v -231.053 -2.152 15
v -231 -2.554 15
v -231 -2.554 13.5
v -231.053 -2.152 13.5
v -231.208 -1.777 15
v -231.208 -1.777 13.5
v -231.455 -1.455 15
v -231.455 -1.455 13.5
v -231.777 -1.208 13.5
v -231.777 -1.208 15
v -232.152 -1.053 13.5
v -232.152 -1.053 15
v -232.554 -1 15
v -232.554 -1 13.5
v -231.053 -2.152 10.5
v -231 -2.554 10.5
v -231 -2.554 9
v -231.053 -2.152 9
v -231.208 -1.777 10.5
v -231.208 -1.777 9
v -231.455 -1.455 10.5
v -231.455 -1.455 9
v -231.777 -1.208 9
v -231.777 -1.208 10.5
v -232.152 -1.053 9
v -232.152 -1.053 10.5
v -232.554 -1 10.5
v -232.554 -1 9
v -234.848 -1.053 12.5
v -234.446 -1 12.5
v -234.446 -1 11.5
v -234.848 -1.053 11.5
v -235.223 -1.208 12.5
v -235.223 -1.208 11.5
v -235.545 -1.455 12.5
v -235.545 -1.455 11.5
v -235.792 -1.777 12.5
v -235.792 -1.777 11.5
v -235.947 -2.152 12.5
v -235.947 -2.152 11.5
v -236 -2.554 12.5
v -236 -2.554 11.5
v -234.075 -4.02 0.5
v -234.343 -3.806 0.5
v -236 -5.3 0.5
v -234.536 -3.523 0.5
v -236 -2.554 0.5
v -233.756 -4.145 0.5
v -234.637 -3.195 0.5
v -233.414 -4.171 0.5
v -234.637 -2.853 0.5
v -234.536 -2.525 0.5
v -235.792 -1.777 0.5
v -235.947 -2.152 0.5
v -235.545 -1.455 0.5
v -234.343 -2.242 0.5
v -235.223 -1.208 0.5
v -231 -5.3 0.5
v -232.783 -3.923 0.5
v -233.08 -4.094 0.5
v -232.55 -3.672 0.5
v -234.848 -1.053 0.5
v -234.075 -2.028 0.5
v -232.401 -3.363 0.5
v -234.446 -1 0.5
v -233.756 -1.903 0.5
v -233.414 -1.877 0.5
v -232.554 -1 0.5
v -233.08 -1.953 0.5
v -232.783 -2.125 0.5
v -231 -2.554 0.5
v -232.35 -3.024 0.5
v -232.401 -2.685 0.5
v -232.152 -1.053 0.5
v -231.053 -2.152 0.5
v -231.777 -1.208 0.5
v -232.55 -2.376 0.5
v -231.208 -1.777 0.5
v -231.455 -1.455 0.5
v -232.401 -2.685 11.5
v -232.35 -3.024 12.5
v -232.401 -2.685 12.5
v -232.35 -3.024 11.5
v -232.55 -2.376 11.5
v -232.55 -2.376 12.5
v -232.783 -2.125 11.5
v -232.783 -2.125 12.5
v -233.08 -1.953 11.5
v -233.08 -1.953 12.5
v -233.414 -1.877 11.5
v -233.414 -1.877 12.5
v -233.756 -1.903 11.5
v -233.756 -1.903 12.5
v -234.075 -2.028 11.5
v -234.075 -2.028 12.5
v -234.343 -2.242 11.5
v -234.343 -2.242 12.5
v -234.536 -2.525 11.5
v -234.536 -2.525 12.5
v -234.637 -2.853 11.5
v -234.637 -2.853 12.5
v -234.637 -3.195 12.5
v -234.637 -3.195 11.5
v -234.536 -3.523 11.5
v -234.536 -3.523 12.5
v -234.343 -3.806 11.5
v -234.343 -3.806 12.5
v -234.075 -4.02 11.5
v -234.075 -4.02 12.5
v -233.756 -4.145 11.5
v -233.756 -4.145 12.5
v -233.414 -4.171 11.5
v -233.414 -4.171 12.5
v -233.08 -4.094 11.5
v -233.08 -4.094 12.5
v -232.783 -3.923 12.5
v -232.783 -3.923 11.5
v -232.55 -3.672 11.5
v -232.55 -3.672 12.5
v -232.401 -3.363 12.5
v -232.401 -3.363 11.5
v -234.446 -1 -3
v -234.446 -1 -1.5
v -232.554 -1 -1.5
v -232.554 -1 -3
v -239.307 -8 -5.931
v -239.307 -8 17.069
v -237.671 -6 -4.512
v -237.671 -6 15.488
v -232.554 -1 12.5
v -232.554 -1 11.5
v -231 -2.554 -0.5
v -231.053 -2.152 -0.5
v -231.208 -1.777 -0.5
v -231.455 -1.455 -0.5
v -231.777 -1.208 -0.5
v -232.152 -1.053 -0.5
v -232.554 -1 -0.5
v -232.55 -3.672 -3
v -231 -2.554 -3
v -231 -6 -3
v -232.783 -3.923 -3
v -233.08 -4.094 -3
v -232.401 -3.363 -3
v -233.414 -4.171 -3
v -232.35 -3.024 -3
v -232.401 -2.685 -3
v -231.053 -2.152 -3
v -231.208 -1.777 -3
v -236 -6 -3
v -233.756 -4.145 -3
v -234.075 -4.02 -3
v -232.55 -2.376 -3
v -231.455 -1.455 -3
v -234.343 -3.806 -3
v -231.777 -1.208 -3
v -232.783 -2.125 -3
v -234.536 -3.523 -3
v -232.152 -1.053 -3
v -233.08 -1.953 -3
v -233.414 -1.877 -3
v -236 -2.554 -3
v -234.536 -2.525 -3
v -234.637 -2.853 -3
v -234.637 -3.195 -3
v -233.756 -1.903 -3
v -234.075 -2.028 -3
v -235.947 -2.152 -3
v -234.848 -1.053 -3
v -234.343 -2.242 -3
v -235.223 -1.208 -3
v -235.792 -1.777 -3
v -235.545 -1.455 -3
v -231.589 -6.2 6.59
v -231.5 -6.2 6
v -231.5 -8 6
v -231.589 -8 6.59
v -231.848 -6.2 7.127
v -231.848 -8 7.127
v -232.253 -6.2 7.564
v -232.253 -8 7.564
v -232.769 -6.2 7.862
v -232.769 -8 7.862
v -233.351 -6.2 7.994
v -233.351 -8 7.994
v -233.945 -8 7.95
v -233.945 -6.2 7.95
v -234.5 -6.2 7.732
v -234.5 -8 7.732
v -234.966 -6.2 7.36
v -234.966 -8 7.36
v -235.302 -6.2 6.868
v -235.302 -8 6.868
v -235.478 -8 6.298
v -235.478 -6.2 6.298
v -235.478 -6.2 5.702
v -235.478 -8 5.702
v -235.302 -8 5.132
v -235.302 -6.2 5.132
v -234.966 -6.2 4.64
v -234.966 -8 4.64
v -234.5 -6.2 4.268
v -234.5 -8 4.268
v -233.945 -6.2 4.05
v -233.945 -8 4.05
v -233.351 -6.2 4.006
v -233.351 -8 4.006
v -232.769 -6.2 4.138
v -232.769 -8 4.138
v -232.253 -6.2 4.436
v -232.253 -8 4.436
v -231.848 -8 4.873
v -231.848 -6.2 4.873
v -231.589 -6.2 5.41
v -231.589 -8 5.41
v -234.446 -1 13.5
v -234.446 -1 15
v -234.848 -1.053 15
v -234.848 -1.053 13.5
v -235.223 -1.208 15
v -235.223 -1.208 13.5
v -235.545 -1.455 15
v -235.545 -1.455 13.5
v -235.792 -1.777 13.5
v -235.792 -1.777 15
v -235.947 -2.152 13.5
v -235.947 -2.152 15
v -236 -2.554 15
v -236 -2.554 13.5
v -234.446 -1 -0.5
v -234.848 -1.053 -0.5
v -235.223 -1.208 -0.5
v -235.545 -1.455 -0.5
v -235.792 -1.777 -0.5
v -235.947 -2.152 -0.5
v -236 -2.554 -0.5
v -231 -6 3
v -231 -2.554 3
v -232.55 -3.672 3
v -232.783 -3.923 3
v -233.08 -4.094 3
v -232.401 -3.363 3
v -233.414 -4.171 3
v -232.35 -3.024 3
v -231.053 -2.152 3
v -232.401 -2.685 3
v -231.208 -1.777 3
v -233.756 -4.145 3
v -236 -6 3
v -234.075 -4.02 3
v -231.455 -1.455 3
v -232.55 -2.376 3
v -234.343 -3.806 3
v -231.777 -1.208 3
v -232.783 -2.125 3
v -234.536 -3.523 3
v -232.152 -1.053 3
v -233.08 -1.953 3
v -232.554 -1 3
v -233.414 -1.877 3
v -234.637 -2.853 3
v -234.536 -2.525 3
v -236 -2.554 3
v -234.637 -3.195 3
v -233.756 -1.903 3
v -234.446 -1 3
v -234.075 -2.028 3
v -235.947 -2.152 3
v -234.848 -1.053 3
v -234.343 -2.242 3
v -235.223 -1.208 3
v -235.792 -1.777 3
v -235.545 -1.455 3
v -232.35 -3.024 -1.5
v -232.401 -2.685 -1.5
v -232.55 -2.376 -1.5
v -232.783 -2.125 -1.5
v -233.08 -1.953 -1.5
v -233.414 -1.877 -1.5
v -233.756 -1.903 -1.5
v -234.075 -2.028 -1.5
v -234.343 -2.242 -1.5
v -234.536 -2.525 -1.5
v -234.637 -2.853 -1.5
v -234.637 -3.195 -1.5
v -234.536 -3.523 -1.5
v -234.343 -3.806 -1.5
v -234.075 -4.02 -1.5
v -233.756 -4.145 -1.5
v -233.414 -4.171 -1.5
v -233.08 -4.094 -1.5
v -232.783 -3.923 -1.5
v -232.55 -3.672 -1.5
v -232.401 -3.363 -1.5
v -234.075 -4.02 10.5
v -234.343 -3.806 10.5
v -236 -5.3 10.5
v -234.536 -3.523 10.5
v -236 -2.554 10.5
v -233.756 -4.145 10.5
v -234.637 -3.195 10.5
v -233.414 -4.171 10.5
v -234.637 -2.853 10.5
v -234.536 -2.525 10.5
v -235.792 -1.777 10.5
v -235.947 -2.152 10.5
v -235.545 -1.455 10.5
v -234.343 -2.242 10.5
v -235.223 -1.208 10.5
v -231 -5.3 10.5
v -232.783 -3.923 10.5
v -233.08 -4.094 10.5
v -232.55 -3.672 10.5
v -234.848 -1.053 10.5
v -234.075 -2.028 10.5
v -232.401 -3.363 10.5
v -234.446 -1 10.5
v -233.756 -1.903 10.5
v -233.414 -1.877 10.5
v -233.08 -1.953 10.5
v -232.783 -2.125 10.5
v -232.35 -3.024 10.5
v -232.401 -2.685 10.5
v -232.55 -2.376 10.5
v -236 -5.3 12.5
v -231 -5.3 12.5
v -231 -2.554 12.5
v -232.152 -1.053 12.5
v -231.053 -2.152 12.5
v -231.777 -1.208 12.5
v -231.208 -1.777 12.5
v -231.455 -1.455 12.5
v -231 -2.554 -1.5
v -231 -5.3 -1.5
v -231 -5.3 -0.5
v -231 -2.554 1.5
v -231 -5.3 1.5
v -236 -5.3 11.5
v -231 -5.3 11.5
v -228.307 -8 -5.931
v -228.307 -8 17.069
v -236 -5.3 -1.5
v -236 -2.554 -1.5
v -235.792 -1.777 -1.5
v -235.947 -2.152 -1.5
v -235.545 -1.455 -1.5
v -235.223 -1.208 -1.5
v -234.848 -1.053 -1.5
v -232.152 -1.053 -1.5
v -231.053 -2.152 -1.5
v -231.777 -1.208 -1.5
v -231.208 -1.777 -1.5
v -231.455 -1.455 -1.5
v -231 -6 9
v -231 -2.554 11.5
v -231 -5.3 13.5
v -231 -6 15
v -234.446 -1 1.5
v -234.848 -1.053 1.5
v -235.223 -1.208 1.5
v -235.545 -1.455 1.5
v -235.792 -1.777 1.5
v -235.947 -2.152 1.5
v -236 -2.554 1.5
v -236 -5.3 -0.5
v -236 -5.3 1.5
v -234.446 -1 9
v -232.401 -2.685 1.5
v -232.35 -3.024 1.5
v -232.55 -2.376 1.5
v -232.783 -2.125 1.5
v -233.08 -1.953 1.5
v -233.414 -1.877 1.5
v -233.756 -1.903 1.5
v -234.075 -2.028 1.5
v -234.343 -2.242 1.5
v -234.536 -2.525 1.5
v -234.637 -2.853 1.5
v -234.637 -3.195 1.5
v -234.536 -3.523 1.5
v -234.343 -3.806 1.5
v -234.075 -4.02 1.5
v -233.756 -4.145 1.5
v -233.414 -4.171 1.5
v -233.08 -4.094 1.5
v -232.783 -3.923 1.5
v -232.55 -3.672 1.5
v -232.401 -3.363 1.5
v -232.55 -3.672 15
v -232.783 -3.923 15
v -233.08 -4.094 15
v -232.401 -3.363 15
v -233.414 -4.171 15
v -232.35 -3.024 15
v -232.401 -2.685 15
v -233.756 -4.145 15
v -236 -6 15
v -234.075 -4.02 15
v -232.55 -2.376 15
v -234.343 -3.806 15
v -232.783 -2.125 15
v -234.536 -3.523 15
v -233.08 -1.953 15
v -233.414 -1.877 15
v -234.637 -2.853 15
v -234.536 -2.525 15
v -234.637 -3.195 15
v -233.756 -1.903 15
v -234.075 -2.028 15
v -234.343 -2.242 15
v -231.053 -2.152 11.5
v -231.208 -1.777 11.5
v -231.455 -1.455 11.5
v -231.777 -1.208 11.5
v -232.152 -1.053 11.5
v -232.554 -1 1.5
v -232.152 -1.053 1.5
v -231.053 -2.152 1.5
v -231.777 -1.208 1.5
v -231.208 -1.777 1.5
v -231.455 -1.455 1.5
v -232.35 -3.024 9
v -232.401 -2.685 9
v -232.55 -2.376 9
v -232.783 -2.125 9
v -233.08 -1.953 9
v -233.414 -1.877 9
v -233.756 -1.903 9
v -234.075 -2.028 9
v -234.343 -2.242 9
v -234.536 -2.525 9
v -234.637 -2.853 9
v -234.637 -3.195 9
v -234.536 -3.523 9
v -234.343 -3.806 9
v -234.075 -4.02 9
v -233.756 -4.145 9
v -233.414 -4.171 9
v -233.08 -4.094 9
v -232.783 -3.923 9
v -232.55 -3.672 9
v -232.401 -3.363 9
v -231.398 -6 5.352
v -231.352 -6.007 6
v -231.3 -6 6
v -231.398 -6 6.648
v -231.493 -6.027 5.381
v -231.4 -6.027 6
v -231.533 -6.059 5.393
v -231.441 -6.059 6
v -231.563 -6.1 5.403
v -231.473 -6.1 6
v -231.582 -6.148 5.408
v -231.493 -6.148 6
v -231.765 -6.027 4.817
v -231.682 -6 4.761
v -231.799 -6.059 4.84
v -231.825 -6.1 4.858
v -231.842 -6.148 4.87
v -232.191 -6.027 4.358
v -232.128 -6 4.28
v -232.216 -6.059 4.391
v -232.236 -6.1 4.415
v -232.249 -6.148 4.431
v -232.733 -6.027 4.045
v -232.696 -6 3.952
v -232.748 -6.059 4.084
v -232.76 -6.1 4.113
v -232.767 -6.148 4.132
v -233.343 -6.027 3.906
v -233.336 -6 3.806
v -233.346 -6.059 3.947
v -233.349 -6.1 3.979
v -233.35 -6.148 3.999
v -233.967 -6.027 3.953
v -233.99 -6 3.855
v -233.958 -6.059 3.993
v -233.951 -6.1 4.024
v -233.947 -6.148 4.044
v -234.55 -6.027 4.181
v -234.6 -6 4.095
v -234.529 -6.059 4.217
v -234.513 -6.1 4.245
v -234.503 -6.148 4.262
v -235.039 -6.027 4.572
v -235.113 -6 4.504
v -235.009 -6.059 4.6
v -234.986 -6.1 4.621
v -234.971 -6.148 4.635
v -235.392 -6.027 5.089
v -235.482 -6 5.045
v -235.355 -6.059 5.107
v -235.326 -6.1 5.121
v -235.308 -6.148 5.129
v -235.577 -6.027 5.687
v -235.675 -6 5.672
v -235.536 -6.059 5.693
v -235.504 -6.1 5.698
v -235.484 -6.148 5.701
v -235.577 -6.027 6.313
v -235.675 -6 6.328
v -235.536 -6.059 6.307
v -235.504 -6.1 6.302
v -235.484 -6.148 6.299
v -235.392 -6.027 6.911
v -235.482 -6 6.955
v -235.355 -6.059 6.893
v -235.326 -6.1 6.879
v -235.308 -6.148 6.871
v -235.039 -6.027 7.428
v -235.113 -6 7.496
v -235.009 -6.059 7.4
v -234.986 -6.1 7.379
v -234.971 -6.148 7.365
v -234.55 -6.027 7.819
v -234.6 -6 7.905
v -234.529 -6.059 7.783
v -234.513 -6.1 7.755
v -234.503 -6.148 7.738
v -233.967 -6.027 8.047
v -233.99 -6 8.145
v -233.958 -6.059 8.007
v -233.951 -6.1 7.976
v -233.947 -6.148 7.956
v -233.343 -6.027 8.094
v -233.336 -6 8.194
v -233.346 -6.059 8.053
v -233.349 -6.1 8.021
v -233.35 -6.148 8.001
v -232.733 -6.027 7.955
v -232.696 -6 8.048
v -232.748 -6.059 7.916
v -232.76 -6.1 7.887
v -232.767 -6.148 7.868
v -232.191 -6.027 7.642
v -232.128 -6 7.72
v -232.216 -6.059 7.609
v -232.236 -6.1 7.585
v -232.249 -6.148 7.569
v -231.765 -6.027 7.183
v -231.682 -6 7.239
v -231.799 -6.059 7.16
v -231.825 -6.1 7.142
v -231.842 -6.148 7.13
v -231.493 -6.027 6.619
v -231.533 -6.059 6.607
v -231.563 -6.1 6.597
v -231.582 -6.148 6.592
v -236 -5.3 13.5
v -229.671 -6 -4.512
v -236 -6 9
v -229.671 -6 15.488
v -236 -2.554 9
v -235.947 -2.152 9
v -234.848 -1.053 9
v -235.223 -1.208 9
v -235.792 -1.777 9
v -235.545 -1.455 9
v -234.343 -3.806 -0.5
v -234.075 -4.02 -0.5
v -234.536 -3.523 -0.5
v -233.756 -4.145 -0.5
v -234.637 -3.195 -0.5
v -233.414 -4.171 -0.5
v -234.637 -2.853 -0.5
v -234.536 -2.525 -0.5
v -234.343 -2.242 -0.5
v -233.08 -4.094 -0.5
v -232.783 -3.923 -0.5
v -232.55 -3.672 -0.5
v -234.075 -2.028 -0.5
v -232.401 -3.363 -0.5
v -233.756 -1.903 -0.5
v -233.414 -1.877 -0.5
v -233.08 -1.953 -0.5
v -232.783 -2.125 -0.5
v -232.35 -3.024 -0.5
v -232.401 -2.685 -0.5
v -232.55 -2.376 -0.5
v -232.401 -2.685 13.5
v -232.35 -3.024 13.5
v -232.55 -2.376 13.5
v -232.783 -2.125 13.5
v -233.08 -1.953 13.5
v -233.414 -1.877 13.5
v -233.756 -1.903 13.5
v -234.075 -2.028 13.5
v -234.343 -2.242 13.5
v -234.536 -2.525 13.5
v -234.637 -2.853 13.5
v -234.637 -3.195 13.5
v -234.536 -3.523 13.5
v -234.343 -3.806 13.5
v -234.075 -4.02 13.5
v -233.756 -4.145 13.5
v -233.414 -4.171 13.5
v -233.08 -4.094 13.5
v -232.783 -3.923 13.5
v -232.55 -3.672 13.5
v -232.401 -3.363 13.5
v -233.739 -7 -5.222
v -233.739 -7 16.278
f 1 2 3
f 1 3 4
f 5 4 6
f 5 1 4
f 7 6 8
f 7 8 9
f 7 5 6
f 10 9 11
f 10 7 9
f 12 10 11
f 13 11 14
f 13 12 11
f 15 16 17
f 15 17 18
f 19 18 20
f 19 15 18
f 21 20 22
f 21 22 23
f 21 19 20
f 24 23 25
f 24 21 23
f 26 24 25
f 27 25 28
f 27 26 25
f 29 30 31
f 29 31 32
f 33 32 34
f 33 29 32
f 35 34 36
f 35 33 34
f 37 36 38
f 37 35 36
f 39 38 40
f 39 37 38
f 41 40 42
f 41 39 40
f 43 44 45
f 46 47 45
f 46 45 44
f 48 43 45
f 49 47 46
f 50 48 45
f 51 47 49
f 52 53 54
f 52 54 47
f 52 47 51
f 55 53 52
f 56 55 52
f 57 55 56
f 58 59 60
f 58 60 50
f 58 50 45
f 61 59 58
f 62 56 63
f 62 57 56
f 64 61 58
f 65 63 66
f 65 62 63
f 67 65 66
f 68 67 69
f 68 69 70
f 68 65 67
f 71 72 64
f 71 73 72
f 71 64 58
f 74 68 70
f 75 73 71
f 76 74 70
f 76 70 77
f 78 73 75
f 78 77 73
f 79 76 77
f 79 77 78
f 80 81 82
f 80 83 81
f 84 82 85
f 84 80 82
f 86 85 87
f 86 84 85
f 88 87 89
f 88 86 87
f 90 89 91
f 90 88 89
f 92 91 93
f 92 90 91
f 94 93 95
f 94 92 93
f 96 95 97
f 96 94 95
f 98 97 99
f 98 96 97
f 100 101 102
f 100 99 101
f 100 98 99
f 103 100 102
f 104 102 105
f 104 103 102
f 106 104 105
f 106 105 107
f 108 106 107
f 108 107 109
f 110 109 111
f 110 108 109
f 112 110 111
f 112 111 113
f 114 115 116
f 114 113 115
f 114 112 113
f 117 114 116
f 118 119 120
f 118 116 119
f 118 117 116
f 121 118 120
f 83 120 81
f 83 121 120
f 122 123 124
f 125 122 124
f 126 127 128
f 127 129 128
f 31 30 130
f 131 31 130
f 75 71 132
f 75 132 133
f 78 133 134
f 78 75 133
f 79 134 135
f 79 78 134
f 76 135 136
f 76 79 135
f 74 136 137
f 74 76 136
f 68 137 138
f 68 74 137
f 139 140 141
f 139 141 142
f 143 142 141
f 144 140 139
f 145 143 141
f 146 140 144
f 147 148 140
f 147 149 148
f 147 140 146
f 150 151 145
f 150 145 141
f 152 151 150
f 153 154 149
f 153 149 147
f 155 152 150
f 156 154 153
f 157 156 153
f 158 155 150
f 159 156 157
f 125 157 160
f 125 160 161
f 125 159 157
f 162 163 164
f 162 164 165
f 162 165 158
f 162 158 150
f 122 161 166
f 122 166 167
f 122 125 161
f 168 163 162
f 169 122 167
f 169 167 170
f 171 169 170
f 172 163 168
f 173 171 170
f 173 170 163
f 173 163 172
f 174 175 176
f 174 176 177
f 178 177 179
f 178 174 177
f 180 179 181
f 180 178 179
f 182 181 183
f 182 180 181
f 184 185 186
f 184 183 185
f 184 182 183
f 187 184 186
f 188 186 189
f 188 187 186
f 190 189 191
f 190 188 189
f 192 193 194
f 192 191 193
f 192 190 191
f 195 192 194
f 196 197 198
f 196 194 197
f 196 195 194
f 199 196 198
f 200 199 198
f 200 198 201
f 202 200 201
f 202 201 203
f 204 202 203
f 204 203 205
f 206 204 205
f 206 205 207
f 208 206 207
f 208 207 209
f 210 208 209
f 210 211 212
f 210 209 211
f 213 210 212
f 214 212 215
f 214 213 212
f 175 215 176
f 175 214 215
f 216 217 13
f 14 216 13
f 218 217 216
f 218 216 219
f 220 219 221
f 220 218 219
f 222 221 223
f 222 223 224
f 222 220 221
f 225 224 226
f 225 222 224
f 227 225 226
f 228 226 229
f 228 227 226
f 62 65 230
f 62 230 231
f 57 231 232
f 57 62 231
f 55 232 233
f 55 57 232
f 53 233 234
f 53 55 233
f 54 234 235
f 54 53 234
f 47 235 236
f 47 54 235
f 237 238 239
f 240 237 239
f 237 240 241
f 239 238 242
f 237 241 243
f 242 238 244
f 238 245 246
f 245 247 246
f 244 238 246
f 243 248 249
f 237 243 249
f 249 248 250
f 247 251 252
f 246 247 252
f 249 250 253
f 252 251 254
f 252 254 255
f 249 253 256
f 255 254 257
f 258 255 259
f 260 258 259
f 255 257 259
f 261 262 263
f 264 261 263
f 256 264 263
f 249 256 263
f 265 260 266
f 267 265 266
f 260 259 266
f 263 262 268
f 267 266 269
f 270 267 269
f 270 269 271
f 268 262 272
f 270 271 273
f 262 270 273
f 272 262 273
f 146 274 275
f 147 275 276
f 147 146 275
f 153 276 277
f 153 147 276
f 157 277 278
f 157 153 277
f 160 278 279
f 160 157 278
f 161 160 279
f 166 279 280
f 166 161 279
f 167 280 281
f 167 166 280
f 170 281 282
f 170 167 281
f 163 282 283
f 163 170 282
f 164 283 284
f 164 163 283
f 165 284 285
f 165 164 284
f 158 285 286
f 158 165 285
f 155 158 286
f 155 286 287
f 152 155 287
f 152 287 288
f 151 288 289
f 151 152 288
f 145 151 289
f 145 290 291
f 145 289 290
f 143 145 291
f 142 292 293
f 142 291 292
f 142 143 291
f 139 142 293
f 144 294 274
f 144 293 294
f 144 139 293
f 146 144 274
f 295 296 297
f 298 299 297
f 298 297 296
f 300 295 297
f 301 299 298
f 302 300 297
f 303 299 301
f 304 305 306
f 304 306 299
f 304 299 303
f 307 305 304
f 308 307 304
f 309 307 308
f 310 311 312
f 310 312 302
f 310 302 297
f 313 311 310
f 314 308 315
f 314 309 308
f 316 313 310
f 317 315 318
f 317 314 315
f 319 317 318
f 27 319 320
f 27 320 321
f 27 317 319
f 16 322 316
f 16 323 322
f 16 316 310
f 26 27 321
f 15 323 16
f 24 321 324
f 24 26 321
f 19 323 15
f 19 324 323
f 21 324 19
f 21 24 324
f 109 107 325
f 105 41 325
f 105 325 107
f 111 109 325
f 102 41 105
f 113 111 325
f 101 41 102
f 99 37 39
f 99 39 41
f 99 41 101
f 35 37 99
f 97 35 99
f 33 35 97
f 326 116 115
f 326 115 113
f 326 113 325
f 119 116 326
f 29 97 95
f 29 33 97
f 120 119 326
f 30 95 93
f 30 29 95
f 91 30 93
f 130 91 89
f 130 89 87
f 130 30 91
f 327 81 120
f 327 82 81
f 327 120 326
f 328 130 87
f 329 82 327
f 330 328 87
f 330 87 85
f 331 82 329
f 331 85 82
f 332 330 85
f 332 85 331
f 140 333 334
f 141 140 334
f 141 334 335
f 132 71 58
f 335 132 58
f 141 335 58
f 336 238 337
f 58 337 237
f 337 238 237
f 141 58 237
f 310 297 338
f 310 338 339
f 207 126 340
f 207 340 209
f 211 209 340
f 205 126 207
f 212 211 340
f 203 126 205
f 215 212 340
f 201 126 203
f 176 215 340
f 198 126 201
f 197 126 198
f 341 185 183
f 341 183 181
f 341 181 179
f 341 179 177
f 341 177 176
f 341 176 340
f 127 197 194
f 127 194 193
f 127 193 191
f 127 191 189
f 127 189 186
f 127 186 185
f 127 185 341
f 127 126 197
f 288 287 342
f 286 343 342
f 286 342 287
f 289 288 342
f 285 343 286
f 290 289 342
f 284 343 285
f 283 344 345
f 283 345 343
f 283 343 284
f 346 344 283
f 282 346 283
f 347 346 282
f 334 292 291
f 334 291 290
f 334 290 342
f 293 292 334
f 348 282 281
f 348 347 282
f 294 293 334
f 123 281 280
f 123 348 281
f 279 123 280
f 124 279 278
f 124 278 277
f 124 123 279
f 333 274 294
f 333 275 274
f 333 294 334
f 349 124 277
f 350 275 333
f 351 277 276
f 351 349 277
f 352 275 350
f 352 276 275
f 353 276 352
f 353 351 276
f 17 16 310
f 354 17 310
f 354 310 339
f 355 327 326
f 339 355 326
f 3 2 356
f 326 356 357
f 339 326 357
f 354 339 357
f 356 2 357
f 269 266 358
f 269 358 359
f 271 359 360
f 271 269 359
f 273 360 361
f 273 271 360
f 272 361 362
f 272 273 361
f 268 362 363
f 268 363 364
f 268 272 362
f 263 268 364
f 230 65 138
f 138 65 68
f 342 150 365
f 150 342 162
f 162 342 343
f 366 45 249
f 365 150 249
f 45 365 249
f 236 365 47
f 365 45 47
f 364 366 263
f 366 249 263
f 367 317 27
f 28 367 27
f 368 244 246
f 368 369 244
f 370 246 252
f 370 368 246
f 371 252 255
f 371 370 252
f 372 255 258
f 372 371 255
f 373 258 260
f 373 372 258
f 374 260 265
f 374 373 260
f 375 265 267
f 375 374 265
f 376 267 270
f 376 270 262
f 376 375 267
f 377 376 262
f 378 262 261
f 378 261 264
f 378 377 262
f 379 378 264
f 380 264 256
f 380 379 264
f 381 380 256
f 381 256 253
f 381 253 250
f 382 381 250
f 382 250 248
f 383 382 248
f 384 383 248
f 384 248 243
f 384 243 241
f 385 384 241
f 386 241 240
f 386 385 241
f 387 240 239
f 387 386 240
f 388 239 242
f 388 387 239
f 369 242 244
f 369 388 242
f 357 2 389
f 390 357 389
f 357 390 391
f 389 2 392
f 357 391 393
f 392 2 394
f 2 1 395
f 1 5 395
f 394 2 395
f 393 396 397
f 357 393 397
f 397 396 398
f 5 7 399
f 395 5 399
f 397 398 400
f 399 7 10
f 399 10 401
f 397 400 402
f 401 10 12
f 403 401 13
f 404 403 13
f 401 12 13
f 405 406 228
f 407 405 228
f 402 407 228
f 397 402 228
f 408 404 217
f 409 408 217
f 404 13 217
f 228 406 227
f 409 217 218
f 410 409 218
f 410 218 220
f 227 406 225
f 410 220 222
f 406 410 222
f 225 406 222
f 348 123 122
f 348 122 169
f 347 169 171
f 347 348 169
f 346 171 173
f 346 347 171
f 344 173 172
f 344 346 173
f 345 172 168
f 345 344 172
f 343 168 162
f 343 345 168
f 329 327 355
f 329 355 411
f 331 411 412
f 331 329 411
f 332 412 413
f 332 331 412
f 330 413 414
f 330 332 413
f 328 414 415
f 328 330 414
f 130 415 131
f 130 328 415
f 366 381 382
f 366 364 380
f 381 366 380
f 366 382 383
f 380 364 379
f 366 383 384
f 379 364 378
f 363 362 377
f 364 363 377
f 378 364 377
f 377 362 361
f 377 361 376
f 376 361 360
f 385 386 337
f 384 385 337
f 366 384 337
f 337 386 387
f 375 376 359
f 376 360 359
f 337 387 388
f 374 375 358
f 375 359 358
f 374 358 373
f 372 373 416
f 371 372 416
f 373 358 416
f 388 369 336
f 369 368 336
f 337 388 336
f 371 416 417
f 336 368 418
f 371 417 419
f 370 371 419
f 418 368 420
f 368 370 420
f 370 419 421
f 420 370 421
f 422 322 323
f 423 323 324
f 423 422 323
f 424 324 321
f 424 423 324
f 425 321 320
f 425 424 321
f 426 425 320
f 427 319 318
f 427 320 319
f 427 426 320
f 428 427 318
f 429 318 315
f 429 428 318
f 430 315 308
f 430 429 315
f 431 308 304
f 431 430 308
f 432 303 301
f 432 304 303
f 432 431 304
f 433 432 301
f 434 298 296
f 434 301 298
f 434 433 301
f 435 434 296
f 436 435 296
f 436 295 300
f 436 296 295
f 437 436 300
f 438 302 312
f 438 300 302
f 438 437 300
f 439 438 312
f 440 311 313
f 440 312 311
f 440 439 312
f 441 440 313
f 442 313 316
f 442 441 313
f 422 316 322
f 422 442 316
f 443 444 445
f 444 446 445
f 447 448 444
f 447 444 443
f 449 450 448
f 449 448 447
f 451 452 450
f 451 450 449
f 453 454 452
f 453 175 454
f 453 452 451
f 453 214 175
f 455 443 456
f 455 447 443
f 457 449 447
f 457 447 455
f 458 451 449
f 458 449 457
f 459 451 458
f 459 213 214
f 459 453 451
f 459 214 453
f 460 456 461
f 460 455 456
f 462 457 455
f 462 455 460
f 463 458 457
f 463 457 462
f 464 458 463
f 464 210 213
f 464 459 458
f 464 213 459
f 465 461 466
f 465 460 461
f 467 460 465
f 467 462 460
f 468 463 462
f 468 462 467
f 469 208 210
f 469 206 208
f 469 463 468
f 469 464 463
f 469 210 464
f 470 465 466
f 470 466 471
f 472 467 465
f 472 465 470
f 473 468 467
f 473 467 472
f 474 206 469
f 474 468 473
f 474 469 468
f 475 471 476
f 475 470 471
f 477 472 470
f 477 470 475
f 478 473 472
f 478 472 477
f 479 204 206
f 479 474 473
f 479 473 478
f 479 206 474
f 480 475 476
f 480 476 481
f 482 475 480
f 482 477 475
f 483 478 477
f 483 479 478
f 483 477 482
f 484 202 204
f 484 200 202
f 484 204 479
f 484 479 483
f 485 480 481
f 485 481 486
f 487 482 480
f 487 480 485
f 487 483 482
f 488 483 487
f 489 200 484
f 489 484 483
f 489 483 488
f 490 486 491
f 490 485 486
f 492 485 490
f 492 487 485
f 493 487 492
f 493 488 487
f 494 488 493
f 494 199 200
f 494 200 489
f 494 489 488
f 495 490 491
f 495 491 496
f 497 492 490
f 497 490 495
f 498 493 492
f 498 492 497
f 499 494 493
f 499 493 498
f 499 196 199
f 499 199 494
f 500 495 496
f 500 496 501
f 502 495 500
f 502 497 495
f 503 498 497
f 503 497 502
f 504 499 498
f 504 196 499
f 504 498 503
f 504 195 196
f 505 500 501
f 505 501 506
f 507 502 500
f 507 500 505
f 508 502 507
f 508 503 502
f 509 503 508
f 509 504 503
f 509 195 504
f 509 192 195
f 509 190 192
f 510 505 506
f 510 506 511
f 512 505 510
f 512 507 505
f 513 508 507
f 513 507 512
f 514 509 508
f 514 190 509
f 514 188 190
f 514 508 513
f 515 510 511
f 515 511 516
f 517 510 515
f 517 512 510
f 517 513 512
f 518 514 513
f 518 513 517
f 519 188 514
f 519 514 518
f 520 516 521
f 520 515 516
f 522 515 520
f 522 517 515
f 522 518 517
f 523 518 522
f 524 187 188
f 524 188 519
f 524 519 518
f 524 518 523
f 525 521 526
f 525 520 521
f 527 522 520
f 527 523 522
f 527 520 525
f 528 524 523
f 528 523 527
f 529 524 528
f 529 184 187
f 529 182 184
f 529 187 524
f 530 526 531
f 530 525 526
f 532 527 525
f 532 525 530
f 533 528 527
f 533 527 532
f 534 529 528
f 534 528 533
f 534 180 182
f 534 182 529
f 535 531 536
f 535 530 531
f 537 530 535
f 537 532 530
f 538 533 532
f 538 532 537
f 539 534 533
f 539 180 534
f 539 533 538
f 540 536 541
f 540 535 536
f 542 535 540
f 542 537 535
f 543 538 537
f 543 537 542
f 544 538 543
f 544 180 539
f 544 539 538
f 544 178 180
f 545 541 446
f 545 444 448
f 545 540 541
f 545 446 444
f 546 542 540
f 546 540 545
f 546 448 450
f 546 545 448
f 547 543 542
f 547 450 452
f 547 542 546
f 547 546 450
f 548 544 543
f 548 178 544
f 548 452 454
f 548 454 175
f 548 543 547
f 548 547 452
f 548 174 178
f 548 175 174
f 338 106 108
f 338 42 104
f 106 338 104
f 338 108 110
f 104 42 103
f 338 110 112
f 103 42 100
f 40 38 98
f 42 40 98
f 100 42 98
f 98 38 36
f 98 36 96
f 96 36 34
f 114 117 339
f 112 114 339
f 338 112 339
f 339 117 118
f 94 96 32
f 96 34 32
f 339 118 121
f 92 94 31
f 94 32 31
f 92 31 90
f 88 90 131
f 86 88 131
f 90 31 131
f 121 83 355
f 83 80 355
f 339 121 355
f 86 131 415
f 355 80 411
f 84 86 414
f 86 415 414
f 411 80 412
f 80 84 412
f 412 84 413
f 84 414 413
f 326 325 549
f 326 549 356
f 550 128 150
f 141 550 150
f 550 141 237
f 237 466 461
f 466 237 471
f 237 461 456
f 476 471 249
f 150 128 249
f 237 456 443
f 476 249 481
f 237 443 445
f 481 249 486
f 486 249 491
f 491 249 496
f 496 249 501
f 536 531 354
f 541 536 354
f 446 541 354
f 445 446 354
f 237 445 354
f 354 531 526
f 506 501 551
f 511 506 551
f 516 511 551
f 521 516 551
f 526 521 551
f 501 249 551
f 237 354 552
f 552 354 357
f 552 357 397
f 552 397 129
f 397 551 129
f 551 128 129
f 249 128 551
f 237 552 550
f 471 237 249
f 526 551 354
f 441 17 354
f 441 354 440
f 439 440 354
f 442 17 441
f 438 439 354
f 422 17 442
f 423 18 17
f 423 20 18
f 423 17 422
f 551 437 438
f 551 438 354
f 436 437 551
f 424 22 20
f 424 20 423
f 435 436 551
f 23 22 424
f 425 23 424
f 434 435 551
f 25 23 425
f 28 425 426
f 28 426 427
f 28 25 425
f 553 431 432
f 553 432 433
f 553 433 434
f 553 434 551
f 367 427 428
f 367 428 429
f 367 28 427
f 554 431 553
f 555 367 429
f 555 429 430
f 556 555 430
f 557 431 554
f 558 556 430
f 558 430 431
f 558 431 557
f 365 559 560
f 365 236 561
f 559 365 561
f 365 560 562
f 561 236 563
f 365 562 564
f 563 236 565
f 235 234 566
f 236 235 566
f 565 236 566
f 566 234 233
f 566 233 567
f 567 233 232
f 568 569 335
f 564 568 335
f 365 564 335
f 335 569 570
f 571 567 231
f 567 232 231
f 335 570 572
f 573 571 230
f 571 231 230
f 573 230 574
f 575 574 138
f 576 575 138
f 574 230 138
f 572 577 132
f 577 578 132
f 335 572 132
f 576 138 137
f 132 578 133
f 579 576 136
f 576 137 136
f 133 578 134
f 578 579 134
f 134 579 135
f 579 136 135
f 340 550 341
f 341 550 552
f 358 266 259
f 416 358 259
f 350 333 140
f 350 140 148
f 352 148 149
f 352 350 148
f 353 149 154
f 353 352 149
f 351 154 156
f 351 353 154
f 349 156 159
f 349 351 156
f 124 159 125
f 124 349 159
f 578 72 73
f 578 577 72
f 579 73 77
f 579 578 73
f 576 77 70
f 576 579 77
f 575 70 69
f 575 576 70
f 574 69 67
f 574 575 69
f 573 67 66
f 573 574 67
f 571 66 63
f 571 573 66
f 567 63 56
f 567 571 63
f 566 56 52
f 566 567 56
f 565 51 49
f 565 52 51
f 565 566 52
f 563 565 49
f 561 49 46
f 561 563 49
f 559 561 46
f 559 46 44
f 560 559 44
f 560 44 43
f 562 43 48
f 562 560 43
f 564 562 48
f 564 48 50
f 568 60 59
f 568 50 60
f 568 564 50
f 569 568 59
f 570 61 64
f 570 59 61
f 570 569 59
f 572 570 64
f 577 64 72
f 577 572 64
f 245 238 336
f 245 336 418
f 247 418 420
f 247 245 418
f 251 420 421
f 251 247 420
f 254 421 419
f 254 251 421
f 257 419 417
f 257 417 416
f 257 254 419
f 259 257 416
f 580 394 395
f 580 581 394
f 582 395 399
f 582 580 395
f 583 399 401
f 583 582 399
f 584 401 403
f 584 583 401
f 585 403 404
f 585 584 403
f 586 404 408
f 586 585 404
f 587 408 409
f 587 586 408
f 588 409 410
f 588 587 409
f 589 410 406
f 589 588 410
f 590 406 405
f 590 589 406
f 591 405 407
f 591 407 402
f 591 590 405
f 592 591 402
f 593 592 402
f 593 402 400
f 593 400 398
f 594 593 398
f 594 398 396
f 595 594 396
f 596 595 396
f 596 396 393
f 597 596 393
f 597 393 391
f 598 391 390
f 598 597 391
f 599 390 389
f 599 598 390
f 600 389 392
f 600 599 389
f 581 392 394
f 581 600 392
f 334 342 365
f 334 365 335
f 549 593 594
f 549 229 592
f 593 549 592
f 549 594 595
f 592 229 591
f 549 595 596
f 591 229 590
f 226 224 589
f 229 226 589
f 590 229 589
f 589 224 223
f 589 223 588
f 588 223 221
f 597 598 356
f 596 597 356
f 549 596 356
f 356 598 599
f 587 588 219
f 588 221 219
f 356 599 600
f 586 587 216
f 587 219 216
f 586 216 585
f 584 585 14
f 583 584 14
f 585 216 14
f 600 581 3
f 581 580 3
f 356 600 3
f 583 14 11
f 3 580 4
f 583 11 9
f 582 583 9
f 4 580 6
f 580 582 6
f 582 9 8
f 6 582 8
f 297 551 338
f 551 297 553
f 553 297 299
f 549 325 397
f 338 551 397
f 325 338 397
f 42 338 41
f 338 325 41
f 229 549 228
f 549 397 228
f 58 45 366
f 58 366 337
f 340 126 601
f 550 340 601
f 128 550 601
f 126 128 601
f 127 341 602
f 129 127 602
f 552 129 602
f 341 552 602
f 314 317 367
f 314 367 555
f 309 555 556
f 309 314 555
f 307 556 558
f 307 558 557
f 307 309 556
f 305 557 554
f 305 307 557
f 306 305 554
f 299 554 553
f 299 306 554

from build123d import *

# Parameters (mm, degrees)
CYLINDER_R          = 2
CYLINDER_DEPTH      = 10
CYLINDER_ROLL_ANGLE = 90
BOX004_W            = 10
BOX004_H            = 10
BOX004_DEPTH        = 1
BOX002_W            = 10
BOX002_H            = 10
BOX002_DEPTH        = 1
SKETCH003_R         = 1.15
PAD_DEPTH           = 3
BOX375_W            = 10
BOX375_H            = 10
BOX375_DEPTH        = 1
BOX374_W            = 10
BOX374_H            = 10
BOX374_DEPTH        = 1
SKETCH015_R         = 1.15
PAD001_DEPTH        = 3
SKETCH018_W         = 11
SKETCH018_H         = 23
SKETCH017_W         = 8
SKETCH017_H         = 20
FILLET_R            = 0.2


with BuildPart() as cilindro:
    # Cylinder → Cylinder (new body)
    with BuildSketch(Plane.XY):
        Circle(CYLINDER_R)
    extrude(amount=CYLINDER_DEPTH)


with BuildPart() as cilindro_1:
    # Cylinder roll: moved
    add(cilindro.part.rotate(Axis((0, 0, 0), (1, 0, 0)), CYLINDER_ROLL_ANGLE))


with BuildPart() as cilindro_2:
    # Cylinder placement: moved
    add(cilindro_1.part.moved(Location((-233.5, 0, 6))))


with BuildPart() as cubo004:
    # Box004 → Box004 (new body)
    with BuildSketch(Plane(origin=(-6, 0.7, 0.5), x_dir=(1, 0, 0), z_dir=(0, 0, 1))):
        with Locations((5, 5)):
            Rectangle(BOX004_W, BOX004_H)
    extrude(amount=BOX004_DEPTH)


with BuildPart() as cubo002:
    # Box002 → Box002 (new body)
    with BuildSketch(Plane(origin=(-5, 0.7, -1.5), x_dir=(1, 0, 0), z_dir=(0, 0, 1))):
        with Locations((5, 5)):
            Rectangle(BOX002_W, BOX002_H)
    extrude(amount=BOX002_DEPTH)


with BuildPart() as pivote_piso:
    # Sketch003 → Pad (new body, symmetric)
    with BuildSketch(Plane.XY):
        with BuildLine():
            Line((-0.94599, 5), (0.94599, 5))
            ThreePointArc((2.5, 3.44599), (2.044841, 4.544841), (0.94599, 5))
            Line((2.5, 3.44599), (2.5, 0))
            Line((2.5, 0), (-2.5, 0))
            Line((-2.5, 0), (-2.5, 3.44599))
            ThreePointArc((-0.94599, 5), (-2.044841, 4.544841), (-2.5, 3.44599))
        make_face()
        with Locations((0, 2.97603)):
            Circle(SKETCH003_R, mode=Mode.SUBTRACT)
    extrude(amount=PAD_DEPTH, both=True)

    # Cut004: cut Cubo002
    add(cubo002.part, mode=Mode.SUBTRACT)

    # Cut005: cut Cubo004
    add(cubo004.part, mode=Mode.SUBTRACT)


with BuildPart() as pivote_piso_1:
    # Cut005 placement: moved
    add(pivote_piso.part.moved(Location((-233.5, -6, 0))))


with BuildPart() as cubo374:
    # Box375 → Box375 (new body)
    with BuildSketch(Plane(origin=(-6, 0.7, 0.5), x_dir=(1, 0, 0), z_dir=(0, 0, 1))):
        with Locations((5, 5)):
            Rectangle(BOX375_W, BOX375_H)
    extrude(amount=BOX375_DEPTH)


with BuildPart() as cubo373:
    # Box374 → Box374 (new body)
    with BuildSketch(Plane(origin=(-5, 0.7, -1.5), x_dir=(1, 0, 0), z_dir=(0, 0, 1))):
        with Locations((5, 5)):
            Rectangle(BOX374_W, BOX374_H)
    extrude(amount=BOX374_DEPTH)


with BuildPart() as pivote_piso001:
    # Sketch015 → Pad001 (new body, symmetric)
    with BuildSketch(Plane.XY):
        with BuildLine():
            Line((-0.94599, 5), (0.94599, 5))
            ThreePointArc((2.5, 3.44599), (2.044841, 4.544841), (0.94599, 5))
            Line((2.5, 3.44599), (2.5, 0))
            Line((2.5, 0), (-2.5, 0))
            Line((-2.5, 0), (-2.5, 3.44599))
            ThreePointArc((-0.94599, 5), (-2.044841, 4.544841), (-2.5, 3.44599))
        make_face()
        with Locations((0, 2.97603)):
            Circle(SKETCH015_R, mode=Mode.SUBTRACT)
    extrude(amount=PAD001_DEPTH, both=True)

    # Cut103: cut Cubo373
    add(cubo373.part, mode=Mode.SUBTRACT)

    # Cut104: cut Cubo374
    add(cubo374.part, mode=Mode.SUBTRACT)


with BuildPart() as pivote_piso001_1:
    # Cut104 placement: moved
    add(pivote_piso001.part.moved(Location((-233.5, -6, 12))))


with BuildPart() as base_cabriada:
    # Sketch018 → Loft section 0
    with BuildSketch(Plane(origin=(0, -9, -0.5), x_dir=(1, 0, 0), z_dir=(0, -1, 0))):
        with Locations((-234.807047, 6.068771)):
            Rectangle(SKETCH018_W, SKETCH018_H)
    # Sketch017 → Loft section 1
    with BuildSketch(Plane.XZ.offset(7)):
        with Locations((-234.670651, 5.48801)):
            Rectangle(SKETCH017_W, SKETCH017_H)
    loft()


with BuildPart() as base_cabriada_1:
    # Loft placement: moved
    add(base_cabriada.part.moved(Location((1, 1, 0))))

    # Fusion067: union Pivote Piso, Pivote Piso001
    add(pivote_piso_1.part)
    add(pivote_piso001_1.part)

    # Cut105: cut Cilindro
    add(cilindro_2.part, mode=Mode.SUBTRACT)

    # Fillet
    fillet_edges = [base_cabriada_1.edges().sort_by_distance(p)[0] for p in [
        (-235.5, -6, 6),
    ]]
    fillet(fillet_edges, radius=FILLET_R)


solid = base_cabriada_1.part
